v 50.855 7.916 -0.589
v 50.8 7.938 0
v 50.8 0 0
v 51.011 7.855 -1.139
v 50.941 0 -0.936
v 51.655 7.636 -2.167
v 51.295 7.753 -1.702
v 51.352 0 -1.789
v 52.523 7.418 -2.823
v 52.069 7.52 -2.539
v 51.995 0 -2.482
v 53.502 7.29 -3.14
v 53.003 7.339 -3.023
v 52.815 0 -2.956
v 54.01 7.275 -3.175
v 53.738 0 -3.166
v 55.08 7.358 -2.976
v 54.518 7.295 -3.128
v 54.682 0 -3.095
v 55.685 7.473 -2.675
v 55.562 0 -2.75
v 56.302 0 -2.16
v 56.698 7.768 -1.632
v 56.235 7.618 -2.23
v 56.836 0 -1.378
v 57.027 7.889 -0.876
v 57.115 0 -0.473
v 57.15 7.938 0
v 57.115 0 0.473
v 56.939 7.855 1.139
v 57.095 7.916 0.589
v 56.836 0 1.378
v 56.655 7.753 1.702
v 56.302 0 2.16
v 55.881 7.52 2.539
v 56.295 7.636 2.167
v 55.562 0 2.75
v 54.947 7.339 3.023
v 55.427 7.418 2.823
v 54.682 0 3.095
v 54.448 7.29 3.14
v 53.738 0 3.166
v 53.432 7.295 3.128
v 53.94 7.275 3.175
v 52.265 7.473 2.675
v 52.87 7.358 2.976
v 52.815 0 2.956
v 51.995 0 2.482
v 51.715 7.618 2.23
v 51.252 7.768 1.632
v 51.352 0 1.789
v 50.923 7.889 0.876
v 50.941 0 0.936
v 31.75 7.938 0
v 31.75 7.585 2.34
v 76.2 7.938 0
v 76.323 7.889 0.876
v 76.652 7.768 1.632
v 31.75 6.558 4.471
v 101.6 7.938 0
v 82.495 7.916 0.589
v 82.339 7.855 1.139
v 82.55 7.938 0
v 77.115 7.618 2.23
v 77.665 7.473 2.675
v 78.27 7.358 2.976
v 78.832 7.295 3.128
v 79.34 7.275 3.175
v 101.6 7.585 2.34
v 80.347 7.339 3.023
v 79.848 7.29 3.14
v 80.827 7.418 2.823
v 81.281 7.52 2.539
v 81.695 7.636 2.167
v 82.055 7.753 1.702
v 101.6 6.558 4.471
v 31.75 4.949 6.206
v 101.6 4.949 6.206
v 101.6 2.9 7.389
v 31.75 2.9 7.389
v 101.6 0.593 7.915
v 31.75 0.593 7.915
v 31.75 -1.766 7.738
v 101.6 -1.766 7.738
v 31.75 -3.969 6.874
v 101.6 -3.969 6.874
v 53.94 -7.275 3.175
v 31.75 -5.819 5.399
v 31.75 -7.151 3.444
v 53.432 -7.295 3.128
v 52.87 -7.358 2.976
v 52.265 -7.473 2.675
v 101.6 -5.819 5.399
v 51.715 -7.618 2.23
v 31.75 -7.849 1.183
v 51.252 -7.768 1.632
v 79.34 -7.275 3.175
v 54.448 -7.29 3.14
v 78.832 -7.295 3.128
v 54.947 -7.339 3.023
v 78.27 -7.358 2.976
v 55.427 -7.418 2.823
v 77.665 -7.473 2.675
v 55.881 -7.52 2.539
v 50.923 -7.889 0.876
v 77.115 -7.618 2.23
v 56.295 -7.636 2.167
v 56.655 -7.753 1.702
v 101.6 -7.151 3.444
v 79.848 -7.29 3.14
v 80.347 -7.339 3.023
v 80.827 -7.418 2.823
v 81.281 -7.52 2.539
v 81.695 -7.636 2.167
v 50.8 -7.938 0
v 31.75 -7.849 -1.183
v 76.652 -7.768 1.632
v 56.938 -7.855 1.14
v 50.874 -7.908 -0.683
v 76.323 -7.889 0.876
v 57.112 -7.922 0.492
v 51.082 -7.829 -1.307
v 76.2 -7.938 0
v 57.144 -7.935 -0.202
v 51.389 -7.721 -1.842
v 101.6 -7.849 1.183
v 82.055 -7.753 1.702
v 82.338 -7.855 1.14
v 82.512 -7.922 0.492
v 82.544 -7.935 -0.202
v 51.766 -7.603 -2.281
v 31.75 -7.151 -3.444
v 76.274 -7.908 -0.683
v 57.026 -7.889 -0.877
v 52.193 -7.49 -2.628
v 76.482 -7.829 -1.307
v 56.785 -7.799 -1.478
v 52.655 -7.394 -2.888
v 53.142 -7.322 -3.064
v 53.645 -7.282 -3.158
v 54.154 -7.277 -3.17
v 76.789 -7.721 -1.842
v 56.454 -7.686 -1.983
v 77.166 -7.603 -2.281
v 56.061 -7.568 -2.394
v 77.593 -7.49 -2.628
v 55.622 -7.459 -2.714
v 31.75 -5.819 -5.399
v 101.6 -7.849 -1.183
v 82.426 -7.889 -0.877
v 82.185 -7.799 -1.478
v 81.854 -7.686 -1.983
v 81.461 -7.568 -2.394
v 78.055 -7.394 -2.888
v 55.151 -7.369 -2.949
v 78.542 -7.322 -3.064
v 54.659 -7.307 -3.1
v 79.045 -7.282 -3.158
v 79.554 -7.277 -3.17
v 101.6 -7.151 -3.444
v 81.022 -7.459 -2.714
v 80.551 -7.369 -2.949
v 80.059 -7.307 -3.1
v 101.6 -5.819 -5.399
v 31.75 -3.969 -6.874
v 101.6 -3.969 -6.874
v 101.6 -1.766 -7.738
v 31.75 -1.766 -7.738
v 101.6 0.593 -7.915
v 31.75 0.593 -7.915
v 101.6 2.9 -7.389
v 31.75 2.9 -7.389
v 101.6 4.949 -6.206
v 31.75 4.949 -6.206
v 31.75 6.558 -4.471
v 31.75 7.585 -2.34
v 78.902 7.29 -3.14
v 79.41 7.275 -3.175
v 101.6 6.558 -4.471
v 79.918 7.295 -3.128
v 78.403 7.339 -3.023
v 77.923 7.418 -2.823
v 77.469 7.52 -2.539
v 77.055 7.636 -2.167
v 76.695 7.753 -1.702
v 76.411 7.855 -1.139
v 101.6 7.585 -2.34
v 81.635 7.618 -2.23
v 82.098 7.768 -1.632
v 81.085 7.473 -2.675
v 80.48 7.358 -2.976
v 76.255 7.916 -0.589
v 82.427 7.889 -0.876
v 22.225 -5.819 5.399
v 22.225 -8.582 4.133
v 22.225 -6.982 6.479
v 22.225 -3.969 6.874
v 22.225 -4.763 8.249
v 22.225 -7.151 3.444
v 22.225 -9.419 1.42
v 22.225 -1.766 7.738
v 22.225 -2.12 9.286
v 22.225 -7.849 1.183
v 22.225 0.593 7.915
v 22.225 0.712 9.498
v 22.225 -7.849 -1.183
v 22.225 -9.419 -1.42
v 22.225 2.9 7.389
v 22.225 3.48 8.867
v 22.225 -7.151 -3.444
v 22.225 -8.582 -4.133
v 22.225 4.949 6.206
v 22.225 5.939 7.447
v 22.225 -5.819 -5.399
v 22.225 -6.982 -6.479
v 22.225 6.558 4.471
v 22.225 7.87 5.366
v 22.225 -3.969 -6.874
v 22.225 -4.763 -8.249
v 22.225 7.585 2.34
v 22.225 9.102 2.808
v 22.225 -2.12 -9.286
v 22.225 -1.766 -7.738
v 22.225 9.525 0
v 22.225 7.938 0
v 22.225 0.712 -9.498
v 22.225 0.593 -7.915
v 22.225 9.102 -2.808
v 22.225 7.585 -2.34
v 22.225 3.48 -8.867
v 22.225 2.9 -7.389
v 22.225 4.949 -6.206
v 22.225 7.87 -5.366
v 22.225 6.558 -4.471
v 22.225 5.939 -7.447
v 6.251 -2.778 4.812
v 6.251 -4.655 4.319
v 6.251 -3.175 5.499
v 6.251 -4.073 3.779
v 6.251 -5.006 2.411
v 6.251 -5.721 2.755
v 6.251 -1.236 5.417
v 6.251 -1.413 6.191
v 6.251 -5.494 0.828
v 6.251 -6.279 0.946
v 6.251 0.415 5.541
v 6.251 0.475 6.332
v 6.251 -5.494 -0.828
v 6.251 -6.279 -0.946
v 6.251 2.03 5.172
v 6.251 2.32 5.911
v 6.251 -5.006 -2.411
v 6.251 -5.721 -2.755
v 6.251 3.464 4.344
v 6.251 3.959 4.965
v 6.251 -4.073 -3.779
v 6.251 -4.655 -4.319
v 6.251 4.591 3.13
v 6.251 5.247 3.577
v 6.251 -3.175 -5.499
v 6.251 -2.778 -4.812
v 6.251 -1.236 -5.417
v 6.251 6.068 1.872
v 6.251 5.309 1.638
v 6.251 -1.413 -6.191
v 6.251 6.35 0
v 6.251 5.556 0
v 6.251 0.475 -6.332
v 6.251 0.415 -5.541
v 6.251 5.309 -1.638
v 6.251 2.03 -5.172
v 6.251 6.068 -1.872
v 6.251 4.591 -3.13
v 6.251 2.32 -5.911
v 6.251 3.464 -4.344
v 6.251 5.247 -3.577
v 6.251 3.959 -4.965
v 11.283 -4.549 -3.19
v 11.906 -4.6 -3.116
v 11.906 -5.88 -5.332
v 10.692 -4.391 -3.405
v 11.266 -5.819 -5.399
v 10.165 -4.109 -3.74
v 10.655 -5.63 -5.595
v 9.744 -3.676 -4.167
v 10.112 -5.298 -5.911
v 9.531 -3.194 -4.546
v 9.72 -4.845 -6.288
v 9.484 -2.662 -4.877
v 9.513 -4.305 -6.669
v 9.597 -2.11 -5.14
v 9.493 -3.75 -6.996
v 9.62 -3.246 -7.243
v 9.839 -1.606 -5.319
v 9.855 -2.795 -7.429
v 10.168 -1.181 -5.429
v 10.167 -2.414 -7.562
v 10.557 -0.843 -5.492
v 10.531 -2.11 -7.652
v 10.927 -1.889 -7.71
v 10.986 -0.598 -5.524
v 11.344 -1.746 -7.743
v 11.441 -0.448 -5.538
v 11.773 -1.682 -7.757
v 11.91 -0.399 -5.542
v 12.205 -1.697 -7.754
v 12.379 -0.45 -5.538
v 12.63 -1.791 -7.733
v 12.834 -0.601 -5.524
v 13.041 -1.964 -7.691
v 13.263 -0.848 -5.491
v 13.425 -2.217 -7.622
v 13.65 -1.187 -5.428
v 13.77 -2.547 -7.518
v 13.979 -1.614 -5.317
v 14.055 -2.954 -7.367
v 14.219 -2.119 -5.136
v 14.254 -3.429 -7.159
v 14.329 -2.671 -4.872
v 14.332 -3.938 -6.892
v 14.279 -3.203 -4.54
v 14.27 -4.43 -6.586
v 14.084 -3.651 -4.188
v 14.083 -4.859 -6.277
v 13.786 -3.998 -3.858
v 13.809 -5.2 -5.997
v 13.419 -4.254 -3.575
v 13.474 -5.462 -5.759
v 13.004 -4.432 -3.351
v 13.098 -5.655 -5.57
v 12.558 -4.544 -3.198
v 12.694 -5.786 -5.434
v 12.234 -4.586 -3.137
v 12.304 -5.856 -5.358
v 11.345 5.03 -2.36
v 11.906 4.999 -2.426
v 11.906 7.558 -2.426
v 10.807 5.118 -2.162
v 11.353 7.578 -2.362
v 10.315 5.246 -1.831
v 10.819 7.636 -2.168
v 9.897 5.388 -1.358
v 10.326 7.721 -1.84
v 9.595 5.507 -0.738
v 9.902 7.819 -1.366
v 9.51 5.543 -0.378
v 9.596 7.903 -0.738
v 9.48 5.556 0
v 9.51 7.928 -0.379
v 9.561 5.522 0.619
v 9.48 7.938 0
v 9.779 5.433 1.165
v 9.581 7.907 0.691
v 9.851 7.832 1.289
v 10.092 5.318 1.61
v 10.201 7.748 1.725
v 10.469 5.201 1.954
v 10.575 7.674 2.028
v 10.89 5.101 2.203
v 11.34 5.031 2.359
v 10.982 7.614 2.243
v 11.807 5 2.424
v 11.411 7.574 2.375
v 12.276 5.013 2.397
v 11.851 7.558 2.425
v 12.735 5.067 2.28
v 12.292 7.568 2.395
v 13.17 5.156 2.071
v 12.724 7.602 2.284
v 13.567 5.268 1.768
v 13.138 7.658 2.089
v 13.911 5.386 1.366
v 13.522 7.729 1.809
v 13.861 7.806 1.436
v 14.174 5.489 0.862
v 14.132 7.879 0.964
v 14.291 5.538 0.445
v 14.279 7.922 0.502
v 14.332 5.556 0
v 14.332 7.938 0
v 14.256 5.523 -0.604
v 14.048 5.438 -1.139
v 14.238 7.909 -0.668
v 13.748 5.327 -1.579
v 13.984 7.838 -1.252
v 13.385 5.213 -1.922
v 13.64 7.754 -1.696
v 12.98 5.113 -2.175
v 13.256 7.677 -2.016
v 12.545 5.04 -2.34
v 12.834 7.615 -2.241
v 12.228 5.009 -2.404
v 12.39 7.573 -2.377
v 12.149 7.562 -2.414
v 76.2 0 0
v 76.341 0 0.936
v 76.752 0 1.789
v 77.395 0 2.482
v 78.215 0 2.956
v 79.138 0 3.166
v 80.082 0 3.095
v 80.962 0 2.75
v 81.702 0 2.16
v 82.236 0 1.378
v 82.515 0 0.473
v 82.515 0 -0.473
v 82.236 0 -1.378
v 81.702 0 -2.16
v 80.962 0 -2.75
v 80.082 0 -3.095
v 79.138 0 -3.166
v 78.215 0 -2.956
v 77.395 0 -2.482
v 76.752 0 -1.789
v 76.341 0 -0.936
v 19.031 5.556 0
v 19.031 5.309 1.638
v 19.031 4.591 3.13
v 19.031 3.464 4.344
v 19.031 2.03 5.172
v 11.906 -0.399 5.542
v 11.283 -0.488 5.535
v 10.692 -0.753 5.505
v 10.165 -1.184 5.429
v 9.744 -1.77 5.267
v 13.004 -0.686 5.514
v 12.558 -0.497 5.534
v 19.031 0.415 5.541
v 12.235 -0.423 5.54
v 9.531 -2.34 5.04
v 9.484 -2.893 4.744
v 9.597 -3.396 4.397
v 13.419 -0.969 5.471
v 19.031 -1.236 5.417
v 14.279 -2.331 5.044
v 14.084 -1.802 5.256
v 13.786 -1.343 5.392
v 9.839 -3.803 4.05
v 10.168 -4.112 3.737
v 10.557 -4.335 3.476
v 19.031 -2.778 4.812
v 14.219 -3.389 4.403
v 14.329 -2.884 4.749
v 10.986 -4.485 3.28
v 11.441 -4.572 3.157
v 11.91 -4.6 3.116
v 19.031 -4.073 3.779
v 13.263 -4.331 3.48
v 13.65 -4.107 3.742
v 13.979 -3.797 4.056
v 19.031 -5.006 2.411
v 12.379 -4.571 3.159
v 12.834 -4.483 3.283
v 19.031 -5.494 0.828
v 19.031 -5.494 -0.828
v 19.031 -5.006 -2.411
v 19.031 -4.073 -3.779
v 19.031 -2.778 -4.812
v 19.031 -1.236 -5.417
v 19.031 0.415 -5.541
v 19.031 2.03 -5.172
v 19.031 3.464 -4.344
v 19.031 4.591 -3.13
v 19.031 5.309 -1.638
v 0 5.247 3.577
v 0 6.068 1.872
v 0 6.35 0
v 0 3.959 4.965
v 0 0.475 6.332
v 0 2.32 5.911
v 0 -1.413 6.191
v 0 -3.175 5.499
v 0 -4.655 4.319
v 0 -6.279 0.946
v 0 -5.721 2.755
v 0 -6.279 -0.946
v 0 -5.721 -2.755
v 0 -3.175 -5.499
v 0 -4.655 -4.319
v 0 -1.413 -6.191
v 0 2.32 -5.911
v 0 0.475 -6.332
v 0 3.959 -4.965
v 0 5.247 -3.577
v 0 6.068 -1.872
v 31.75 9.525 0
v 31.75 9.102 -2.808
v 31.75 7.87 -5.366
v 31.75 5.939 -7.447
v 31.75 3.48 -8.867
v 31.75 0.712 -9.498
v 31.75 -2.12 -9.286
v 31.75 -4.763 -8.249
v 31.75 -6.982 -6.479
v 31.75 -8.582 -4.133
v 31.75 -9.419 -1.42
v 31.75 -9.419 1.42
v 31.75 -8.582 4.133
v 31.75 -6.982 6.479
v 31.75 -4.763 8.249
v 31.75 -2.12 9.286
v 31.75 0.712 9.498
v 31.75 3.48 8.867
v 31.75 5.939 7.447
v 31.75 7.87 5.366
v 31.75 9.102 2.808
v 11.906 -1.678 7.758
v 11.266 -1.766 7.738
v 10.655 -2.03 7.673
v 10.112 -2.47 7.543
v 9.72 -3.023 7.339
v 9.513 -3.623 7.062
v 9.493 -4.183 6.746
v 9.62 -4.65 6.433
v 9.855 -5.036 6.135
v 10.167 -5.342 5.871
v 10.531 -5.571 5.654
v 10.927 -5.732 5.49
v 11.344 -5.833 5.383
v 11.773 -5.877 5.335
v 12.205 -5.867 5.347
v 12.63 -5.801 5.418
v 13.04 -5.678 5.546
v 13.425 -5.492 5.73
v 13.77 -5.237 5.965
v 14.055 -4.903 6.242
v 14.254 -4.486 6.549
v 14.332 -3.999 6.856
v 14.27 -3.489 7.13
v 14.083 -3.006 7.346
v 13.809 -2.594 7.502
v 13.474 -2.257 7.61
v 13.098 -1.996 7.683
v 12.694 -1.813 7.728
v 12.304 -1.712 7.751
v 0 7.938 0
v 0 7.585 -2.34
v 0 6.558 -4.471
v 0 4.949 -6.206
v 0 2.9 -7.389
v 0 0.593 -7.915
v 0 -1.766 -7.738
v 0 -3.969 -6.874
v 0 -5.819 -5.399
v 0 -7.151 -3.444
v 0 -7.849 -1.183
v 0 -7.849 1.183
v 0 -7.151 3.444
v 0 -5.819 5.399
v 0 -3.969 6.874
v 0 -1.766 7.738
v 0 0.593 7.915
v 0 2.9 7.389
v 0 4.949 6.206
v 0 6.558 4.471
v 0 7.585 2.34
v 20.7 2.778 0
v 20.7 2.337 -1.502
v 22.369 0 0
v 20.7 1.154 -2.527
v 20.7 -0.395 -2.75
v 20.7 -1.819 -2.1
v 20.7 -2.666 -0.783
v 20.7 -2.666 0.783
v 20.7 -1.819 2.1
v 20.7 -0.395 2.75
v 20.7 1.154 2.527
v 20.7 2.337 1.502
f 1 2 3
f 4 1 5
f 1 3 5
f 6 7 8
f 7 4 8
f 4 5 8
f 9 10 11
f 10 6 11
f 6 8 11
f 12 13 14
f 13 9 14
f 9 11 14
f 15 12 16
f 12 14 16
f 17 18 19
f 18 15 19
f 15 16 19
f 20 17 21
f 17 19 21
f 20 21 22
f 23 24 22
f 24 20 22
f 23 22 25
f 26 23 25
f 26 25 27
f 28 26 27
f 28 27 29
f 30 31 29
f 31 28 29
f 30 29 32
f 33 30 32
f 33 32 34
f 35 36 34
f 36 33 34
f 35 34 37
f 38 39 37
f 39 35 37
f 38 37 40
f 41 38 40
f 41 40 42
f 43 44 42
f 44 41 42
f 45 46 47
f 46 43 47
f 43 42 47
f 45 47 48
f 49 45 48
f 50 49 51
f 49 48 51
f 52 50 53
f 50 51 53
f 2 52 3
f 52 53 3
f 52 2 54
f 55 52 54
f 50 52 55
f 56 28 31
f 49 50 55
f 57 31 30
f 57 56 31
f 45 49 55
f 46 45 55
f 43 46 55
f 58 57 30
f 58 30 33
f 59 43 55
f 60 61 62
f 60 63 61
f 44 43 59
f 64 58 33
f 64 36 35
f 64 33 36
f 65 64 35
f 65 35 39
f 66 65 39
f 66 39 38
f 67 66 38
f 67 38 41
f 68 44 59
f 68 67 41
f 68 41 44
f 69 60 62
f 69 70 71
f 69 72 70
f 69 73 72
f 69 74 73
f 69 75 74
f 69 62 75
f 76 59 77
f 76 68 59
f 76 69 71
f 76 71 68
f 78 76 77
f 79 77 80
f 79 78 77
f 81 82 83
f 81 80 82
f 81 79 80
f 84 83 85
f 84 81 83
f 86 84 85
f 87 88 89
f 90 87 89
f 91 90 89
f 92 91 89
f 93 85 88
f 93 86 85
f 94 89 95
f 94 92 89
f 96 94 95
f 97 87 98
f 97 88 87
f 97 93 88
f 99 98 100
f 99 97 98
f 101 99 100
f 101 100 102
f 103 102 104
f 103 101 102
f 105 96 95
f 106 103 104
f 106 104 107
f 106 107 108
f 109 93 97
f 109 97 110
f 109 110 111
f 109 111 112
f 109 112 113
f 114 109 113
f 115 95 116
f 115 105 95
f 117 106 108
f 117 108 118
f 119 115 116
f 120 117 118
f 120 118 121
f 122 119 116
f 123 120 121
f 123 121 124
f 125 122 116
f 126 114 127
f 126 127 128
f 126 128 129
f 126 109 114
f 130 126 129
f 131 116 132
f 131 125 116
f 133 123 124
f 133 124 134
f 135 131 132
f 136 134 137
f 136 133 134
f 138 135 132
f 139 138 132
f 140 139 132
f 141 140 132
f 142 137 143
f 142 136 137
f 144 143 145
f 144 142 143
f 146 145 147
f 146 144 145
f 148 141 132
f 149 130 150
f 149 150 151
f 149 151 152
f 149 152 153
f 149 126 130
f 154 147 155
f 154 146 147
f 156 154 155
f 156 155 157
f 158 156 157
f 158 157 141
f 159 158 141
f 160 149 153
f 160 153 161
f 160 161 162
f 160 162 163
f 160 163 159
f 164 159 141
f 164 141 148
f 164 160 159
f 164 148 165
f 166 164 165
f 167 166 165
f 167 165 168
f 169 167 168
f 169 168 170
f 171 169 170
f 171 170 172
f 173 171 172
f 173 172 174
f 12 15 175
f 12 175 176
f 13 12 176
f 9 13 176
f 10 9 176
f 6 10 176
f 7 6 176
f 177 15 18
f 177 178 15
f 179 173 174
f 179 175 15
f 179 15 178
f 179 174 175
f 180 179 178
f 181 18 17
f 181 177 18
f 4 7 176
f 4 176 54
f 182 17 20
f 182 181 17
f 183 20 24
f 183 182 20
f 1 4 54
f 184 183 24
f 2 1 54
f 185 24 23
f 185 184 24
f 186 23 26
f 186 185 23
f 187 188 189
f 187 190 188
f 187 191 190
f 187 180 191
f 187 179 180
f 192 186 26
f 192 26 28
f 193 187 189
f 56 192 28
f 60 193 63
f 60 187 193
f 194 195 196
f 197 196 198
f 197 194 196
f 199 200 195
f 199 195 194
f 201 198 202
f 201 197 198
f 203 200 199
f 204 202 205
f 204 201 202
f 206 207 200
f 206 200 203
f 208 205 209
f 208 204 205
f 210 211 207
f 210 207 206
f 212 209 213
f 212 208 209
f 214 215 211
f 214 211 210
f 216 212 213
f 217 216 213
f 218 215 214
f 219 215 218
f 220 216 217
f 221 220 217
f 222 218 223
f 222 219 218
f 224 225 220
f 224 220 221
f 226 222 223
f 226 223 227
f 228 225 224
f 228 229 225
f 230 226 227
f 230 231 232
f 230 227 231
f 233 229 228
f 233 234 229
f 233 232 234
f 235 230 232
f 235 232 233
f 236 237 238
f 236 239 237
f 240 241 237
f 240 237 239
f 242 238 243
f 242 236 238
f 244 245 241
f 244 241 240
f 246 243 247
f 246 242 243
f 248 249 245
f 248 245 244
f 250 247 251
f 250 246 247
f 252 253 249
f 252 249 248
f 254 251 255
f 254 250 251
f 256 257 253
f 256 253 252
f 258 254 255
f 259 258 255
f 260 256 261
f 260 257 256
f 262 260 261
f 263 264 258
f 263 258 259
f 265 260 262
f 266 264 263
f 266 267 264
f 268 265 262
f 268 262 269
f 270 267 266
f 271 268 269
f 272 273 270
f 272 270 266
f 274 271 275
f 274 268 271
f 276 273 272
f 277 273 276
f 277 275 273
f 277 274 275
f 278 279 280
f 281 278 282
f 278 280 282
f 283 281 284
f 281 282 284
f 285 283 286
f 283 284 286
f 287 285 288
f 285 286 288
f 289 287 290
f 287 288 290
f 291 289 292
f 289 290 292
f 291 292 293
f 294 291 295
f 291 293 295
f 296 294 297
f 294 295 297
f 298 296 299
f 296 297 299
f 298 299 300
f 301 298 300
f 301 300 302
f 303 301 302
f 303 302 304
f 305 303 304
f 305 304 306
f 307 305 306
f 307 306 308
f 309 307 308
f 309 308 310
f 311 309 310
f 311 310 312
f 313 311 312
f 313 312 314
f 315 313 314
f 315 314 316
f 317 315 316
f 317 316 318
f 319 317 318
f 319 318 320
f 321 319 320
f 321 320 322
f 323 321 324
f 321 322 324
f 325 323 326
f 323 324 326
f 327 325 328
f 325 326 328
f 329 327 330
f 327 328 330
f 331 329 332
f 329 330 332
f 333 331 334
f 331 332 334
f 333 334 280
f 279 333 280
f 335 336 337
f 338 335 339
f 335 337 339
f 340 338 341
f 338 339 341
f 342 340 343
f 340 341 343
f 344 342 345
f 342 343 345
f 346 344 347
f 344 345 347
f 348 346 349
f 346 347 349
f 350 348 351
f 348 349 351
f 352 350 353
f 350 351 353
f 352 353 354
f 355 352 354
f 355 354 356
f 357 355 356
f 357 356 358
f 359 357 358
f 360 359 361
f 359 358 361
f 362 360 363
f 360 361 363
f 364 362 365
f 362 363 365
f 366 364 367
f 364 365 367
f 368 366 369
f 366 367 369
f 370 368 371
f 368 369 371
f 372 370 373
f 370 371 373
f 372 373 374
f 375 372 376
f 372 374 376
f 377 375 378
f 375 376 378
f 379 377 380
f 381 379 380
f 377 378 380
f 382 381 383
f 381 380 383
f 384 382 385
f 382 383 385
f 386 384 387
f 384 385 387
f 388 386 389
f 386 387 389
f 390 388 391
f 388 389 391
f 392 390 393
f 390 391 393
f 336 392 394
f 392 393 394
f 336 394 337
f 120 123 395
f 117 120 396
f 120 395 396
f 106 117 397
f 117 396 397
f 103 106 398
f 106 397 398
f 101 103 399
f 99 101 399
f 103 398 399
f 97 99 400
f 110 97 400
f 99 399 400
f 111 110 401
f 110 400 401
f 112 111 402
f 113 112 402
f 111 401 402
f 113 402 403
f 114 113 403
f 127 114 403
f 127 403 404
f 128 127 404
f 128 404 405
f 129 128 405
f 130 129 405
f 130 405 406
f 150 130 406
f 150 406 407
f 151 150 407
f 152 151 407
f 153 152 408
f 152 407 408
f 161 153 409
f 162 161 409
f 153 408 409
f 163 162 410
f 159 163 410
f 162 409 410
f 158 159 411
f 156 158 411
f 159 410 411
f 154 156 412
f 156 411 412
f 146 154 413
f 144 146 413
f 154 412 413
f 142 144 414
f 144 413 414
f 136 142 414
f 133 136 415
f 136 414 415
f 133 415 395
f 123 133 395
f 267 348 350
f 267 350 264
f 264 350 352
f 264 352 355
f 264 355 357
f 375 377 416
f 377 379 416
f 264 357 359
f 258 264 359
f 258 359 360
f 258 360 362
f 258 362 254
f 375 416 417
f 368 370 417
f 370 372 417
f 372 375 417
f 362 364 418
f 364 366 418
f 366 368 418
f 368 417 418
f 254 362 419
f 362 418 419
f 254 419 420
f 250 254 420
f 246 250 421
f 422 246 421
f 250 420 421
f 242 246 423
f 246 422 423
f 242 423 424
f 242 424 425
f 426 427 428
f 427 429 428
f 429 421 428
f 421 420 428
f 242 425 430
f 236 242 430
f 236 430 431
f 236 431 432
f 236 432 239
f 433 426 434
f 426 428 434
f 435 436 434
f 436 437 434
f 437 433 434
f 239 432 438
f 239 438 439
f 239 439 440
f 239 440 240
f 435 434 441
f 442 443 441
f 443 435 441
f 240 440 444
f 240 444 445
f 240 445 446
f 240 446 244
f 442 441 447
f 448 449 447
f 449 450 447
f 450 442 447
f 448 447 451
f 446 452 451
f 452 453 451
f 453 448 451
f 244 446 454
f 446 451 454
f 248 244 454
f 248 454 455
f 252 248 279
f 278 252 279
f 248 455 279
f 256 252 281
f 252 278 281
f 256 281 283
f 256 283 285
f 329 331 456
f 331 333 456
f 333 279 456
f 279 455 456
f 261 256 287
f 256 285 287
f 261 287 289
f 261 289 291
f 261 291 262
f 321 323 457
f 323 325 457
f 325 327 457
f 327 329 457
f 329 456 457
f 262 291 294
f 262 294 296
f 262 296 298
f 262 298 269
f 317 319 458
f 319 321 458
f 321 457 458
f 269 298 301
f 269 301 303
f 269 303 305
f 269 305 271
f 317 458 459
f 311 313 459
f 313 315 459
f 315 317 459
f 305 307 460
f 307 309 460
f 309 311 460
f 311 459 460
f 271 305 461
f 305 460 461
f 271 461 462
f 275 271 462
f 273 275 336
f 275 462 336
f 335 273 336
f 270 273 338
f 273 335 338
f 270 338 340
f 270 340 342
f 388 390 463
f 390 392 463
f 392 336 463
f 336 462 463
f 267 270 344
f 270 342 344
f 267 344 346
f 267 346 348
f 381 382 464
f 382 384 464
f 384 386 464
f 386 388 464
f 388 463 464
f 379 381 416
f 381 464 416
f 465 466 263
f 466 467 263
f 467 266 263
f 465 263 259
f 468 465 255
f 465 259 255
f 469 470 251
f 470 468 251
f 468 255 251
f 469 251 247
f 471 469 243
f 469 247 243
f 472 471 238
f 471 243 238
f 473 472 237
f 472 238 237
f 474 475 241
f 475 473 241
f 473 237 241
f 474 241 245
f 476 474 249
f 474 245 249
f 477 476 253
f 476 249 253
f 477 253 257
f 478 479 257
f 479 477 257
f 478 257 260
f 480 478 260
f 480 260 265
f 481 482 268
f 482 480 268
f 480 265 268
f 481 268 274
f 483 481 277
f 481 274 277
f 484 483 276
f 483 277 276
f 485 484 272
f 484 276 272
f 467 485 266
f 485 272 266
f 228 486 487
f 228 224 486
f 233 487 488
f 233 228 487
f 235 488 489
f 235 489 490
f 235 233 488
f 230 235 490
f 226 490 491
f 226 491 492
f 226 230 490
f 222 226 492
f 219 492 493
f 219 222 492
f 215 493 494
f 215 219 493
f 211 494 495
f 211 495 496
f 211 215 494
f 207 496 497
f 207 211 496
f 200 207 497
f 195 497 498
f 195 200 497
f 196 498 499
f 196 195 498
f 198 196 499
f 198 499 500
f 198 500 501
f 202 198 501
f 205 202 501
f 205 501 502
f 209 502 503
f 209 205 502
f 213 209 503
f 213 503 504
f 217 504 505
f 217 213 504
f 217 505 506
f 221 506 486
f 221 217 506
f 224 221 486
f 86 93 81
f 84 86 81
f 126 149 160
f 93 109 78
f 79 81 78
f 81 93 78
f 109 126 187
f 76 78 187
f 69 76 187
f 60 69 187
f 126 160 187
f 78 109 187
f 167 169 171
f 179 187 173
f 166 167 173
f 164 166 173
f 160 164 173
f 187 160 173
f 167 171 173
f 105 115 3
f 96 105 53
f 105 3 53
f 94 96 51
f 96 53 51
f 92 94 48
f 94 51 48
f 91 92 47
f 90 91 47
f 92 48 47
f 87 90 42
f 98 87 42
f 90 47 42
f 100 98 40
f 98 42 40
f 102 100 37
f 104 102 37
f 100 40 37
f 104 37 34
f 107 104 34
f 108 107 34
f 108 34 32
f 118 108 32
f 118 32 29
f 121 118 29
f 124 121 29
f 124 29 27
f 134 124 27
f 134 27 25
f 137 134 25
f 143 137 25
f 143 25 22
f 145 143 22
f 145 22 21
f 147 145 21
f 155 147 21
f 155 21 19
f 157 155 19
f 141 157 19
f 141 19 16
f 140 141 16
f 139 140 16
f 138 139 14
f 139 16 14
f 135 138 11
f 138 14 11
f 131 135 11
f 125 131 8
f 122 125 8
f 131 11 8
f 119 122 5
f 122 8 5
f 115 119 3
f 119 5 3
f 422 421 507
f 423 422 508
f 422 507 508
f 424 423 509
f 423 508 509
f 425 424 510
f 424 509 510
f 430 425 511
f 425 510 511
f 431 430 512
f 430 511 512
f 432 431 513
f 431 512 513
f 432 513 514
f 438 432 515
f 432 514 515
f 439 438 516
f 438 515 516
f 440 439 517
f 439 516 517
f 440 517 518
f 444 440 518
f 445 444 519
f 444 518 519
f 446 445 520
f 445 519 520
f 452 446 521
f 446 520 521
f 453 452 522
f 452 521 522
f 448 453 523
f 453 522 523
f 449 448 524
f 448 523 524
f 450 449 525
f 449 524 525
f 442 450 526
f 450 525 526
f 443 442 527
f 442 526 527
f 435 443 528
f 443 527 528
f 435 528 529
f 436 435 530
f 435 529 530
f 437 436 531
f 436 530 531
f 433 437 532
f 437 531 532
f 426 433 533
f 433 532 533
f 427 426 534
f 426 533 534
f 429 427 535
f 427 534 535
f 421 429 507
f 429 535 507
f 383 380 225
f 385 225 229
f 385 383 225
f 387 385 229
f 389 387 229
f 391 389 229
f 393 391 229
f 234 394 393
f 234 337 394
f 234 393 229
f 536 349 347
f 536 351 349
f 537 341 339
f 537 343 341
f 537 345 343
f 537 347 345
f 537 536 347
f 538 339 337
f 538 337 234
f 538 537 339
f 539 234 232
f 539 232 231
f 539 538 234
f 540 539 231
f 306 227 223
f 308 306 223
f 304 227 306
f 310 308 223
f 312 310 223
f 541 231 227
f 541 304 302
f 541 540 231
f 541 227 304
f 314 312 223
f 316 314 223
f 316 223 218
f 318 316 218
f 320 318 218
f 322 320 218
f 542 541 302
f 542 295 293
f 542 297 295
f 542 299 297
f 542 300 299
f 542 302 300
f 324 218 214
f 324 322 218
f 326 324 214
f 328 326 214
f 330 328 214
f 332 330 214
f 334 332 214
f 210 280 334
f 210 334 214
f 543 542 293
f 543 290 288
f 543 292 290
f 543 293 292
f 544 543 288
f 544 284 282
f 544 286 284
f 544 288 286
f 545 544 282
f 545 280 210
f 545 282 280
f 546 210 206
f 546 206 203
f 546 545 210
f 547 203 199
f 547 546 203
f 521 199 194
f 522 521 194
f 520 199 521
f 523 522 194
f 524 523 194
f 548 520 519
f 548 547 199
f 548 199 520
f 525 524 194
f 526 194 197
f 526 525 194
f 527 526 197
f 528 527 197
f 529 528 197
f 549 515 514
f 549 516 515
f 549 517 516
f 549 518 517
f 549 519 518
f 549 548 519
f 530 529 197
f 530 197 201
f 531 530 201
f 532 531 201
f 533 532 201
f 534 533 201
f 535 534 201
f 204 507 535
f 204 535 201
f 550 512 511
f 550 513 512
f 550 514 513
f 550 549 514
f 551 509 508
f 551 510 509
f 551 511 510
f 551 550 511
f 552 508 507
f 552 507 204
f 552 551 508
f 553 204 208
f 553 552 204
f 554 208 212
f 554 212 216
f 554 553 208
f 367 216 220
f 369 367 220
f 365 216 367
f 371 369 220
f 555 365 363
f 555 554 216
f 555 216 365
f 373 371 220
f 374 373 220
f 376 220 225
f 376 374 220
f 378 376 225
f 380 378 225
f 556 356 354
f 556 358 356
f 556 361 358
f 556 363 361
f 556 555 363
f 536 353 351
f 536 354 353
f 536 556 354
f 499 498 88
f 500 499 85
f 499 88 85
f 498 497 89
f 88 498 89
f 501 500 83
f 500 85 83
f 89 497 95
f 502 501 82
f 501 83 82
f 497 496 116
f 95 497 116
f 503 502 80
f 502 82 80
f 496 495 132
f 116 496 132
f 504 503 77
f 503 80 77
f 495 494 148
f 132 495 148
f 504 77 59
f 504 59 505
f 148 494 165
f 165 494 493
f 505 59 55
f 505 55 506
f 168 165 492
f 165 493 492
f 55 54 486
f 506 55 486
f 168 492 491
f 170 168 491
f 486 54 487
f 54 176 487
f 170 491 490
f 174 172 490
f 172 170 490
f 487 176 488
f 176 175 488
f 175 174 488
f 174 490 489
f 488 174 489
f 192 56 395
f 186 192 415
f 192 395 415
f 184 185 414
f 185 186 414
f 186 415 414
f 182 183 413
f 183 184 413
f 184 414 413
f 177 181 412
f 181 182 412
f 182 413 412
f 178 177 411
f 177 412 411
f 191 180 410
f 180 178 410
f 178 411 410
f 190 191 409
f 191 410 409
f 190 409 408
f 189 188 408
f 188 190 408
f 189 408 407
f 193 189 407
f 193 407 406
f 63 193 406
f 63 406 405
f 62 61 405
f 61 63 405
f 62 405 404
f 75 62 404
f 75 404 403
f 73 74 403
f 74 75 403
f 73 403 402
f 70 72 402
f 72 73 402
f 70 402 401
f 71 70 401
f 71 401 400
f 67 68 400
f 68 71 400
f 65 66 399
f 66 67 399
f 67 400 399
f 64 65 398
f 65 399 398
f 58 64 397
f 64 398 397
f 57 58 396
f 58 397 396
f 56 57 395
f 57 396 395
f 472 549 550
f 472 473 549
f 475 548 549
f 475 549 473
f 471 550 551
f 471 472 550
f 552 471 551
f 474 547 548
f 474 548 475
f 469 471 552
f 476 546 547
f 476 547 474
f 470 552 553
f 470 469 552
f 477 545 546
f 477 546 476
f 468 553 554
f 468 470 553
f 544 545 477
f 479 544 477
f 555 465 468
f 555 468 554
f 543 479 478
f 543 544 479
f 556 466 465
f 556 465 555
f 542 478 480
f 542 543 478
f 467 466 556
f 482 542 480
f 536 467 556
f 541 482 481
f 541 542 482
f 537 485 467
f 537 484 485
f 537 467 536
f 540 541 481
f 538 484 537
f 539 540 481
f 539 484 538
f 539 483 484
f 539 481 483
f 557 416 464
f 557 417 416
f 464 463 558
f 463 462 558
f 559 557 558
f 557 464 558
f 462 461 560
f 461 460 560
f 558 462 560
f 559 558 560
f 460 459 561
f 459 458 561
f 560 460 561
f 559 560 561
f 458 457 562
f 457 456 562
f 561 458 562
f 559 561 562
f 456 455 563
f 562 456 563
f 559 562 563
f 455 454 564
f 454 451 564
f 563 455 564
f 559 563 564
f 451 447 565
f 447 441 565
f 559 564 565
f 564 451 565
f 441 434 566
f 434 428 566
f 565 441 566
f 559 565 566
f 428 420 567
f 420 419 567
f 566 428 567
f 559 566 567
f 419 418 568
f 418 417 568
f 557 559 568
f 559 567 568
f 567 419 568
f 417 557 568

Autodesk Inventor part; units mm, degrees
ref_plane "YZ Plane" through (0, 0, 0) normal (1, 0, 0) x (0, 1, 0)
ref_plane "XZ Plane" through (0, 0, 0) normal (0, 1, 0) x (-1, 0, 0)
ref_plane "XY Plane" through (0, 0, 0) normal (0, 0, 1) x (1, 0, 0)
sketch "Sketch1" plane through (0, 0, 0) normal (0, 0, 1) x (1, 0, 0)
  line L0 (0, 0) -> (21.9725, 0)
  line L1 (40.4812, 0) -> (40.4812, 7.9375) construction
  line L2 (40.4812, 7.9375) -> (31.75, 7.9375)
  line L3 (0, 7.9375) -> (0, 6.35)
  line L4 (31.75, 0) -> (31.75, 7.9375) construction
  line L5 (31.75, 9.525) -> (22.225, 9.525)
  line L6 (22.225, 9.525) -> (22.225, 7.9375)
  line L7 (8.7312, 0) -> (8.7312, 17.4625) construction
  line L8 (8.7312, 17.4625) -> (0, 17.4625) construction
  line L9 (0, 17.4625) -> (0, 7.9375) construction
  line L10 (8.7312, 14.2875) -> (9.525, 14.2875) construction
  line L11 (9.525, 14.2875) -> (9.525, 7.9375) construction
  line L12 (9.525, 14.2875) -> (9.525, 27.94) construction
  line L13 (9.525, 27.94) -> (19.05, 27.94) construction
  line L14 (19.05, 27.94) -> (19.05, 7.9375) construction
  line L15 (22.225, 9.525) -> (22.225, 14.2875) construction
  line L16 (22.225, 14.2875) -> (21.4312, 14.2875) construction
  line L17 (21.4312, 14.2875) -> (21.4312, 7.9375) construction
  line L18 (21.4312, 14.2875) -> (21.4312, 17.4625) construction
  line L19 (21.4312, 17.4625) -> (14.2875, 17.4625) construction
  line L20 (14.2875, 17.4625) -> (14.2875, 0) construction
  line L21 (14.2875, 27.94) -> (14.2875, 17.4625) construction
  line L22 (14.1605, 27.94) -> (14.1605, 0) construction
  line L23 (11.9062, 27.94) -> (11.9062, 0) construction
  circle A0 centre (11.9062, 7.5565) radius 2.3813 construction
  line L24 (0, 5.5562) -> (6.2514, 5.5563) construction
  line L25 (0, 6.35) -> (6.2514, 6.35)
  line L26 (6.2514, 6.35) -> (6.2514, 5.5563)
  line L27 (6.2514, 5.5563) -> (6.2514, 0) construction
  line L28 (9.8391, 5.1753) -> (13.9734, 5.1753) construction
  line L29 (0, 3.175) -> (12.7284, 3.175)
  line L30 (6.2514, 5.5563) -> (19.0308, 5.5563)
  line L31 (0, 6.35) -> (0, 0) construction
  circle A1 centre (11.9062, 5.5562) radius 2.3813 construction
  circle A2 centre (11.9062, 5.8103) radius 2.3813 construction
  line L32 (14.2875, 8.1915) -> (9.525, 8.1915) construction
  line L33 (0, 3.175) -> (-5.4674, 3.175)
  line L34 (-5.4674, 3.175) -> (-5.4674, 2.3813)
  line L35 (-5.4674, 2.3813) -> (-10.4458, 2.3812)
  line L36 (-10.4458, 2.3812) -> (-10.4458, 0)
  line L37 (-10.4458, 0) -> (0, 0)
  line L38 (9.8391, 5.1753) -> (7.8389, 3.175) construction
  line L39 (12.7284, 3.175) -> (14.7286, 5.1753)
  line L40 (13.9734, 5.1753) -> (17.083, 0) construction
  line L41 (14.7286, 5.1753) -> (18.8629, 5.1753)
  line L42 (18.8629, 5.1753) -> (21.9725, 0)
  line L43 (19.0308, 5.5563) -> (22.3693, 0)
  line L44 (22.225, 5.5563) -> (31.75, 5.5563) construction
  line L45 (19.0308, 5.5563) -> (22.225, 5.5563) construction
  line L46 (22.225, 7.9375) -> (22.225, 0) construction
  line L47 (31.75, 7.9375) -> (31.75, 9.525)
  line L48 (31.75, 7.9375) -> (22.225, 7.9375) construction
  line L49 (22.225, 7.9375) -> (0, 7.9375)
  line L50 (31.75, 5.5563) -> (40.4812, 5.5563) construction
  line L51 (22.225, 0) -> (22.3693, 0) construction
  line L52 (22.3693, 0) -> (22.225, 0) construction
  line L53 (21.9725, 0) -> (22.3693, 0) construction
  line L54 (12.7284, 3.175) -> (40.4812, 3.175) construction
  line L55 (40.4812, 7.9375) -> (101.6, 7.9375)
  line L56 (101.6, 7.9375) -> (101.6, 0)
  line L57 (101.6, 0) -> (40.4812, 0)
  line L58 (22.3693, 0) -> (40.4812, 0)
  dimension "d0" = 7.9375
  dimension "d1" = 40.4813
  dimension "d2" = 9.525
  dimension "d3" = 8.7312
  dimension "d5" = 22.225
  dimension "d6" = 17.4625
  dimension "d7" = 8.7312
  dimension "d8" = 0.7937
  dimension "d9" = 14.2875
  dimension "d10" = 27.94
  dimension "d11" = 9.525
  dimension "d12" = 0.7937
  dimension "d14" = 7.1437
  dimension "d15" = 17.4625
  dimension "d16" = 0.127
  dimension "d17" = 4.7625
  dimension "d18" = 4.7625
  dimension "d19" = 5.5563
  dimension "d20" = 6.35
  dimension "d22" = 3.175
  dimension "d23" = 4.7625
  dimension "d24" = 4.7625
  dimension "d25" = 4.7625
  dimension "d26" = 0.254
  dimension "d27" = 2.0671
  dimension "d29" = 0.381
  dimension "d30" = 5.4673
  dimension "d31" = 4.9784
  dimension "d32" = 2.3813
  dimension "d33" = 45
  dimension "d34" = 45
  dimension "d35" = 0.0635
  dimension "d36" = 2.0671
  dimension "d37" = 59
  dimension "d38" = 4.1342
  dimension "d39" = 1.5875
  dimension "d40" = 0.3969
  dimension "d41" = 9.525
  dimension "d42" = 14.2875
  dimension "d43" = 61.1187
  dimension "d45" = 14.7287
  dimension "d46" = 9.8392
revolve "Revolution1" add sketch "Sketch1" angle 360 about axis through (101.6, 0, 0) along (-1, 0, 0) contours L55 L56 L57 L58 L43 L30 L26 L25 L3 L49 L6 L5 L47 L2
sketch "Sketch2" plane through (0, 0, 0) normal (0, 1, 0) x (-1, 0, 0)
  line L0 (-101.6, 7.9375) -> (-101.6, -7.9375) projected
  line L1 (-31.75, 7.9375) -> (-31.75, -7.9375) projected
  line L2 (-101.6, 0) -> (-53.975, 0) construction
  circle A0 centre (-79.375, 0) radius 3.175
  circle A1 centre (-53.975, 0) radius 3.175
  point P0 (0, 0)
  point P1 (-11.9062, 0)
  point P2 (-11.9062, 0)
  point P3 (-11.9062, 0)
  point P4 (-11.9062, 0)
  dimension "d59" = 25.4
  dimension "d60" = 22.225
  dimension "d61" = 6.35
  dimension "d62" = 6.35
hole "Hole1" at (11.9062, 0, 0) direction (0, 1, 0) diameter 4.8514 end through all
extrude "Extrusion1" cut sketch "Sketch2" along normal through all both and the other way through all
pattern_circular "Circular Pattern1" count 3 over 360 about axis through (-10, 0, 0) along (1, 0, 0) of "Hole1"
ref_plane "Work Plane1" through (14.7286, 0, 0) normal (-1, 0, 0) x (0, 0, 1)
ref_plane "Work Plane2" through (9.8391, 0, 0) normal (-1, 0, 0) x (0, 0, 1)
equation "\"d7\" = d3"
equation "\"d12\" = d8"
equation "\"d15\" = d6"
equation "\"d34\" = d33"
equation "\"d36\" = d27"
equation "\"d38\" = d27 + d36"
equation "\"d42\" = d9"
equation "\"d61\" = d62"
equation "\"d57\" = -d45"
equation "\"d58\" = -d46"
properties part number "Ball Shift"
